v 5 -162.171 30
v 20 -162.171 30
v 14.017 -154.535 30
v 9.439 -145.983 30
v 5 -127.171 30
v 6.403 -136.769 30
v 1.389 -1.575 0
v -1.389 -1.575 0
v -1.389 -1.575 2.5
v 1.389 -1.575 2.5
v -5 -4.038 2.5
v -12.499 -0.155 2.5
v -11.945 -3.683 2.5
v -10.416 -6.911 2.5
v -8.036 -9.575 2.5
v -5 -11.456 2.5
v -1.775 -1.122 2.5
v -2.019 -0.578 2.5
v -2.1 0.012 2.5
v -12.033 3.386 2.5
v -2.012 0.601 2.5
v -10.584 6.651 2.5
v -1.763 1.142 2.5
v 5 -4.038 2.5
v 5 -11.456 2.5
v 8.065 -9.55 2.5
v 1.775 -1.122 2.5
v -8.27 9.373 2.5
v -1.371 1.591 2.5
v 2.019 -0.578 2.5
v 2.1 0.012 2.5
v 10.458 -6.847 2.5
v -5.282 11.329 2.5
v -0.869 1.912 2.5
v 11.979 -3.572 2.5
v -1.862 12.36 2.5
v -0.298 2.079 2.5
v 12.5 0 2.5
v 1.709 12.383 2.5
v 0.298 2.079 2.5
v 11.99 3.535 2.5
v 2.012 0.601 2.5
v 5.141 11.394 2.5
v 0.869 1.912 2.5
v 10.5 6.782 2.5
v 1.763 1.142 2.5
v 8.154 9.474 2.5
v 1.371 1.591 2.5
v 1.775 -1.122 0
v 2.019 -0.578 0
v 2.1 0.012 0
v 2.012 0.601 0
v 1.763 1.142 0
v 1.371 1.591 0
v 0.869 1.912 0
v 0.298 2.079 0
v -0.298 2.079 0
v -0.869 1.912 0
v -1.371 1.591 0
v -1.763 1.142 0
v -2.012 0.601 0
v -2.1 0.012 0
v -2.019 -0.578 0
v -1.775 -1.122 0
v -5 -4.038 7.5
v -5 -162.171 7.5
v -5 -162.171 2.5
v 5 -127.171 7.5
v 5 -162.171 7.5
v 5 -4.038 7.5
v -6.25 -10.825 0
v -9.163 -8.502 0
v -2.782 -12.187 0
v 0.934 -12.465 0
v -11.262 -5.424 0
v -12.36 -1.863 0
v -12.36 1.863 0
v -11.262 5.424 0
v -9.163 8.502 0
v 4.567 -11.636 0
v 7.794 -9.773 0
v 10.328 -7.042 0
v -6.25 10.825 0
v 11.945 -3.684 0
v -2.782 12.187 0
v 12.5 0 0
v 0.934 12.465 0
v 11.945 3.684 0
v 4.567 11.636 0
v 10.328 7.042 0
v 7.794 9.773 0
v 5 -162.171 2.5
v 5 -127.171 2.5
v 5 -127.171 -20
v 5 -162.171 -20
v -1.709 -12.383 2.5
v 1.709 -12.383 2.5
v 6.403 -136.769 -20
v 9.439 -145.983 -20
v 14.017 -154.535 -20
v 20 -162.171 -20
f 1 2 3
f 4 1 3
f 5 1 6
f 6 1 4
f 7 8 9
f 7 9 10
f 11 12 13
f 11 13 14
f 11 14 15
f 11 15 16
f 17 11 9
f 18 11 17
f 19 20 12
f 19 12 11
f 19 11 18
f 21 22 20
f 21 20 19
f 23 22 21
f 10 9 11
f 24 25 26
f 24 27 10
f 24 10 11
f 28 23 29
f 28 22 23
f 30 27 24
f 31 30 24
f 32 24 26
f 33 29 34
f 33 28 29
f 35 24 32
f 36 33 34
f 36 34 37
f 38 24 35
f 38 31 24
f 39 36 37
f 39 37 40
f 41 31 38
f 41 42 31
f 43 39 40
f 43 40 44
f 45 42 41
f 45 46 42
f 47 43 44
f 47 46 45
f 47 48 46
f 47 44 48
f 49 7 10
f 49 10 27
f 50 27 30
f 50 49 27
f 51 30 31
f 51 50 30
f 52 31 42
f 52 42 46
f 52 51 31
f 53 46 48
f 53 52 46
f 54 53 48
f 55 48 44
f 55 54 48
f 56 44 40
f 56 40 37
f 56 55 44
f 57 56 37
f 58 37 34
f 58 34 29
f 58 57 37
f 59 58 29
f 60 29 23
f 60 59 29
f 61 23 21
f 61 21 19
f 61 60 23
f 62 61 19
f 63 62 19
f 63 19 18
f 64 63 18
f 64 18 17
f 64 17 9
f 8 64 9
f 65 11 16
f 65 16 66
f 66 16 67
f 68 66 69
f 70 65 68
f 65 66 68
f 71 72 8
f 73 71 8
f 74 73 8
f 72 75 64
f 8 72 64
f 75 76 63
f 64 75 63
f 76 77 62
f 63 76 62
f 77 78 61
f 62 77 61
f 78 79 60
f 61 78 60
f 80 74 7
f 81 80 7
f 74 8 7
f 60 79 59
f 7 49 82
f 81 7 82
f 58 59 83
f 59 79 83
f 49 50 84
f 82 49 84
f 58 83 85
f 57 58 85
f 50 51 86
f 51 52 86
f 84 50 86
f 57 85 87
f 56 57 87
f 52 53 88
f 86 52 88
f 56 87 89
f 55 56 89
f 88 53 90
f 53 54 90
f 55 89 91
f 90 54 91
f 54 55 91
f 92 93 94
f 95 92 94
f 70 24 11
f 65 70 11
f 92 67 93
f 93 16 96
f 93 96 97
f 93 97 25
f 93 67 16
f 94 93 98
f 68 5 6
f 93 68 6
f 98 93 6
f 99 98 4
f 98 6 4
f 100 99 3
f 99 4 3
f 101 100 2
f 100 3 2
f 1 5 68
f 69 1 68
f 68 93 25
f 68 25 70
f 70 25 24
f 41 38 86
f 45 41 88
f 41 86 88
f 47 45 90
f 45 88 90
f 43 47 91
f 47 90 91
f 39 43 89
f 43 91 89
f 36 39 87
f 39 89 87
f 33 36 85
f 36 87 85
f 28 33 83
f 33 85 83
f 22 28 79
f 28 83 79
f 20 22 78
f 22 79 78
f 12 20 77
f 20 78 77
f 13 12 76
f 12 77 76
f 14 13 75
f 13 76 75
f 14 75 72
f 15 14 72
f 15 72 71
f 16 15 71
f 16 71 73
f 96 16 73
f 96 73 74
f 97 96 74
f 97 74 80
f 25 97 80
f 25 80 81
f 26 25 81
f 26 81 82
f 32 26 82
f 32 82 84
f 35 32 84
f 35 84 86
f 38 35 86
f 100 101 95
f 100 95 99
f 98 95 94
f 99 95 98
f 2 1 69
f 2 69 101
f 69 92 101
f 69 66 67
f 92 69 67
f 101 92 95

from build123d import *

# Parameters (mm, degrees)
SKETCH2_R               = 12.5
BOSS_EXTRUDE1_DEPTH     = 2.5
BOSS_EXTRUDE2_DEPTH     = 5
SKETCH5_W               = 50
SKETCH5_H               = 35
BOSS_EXTRUDE3_DEPTH     = 15
CUT_EXTRUDE1_DEPTH      = 171.878020085
CUT_EXTRUDE1_DEPTH_BACK = 171.878020085


with BuildPart() as part:
    # Sketch2 → Boss-Extrude1 (new body)
    with BuildSketch(Plane.XY):
        Circle(SKETCH2_R)
        with BuildLine():
            ThreePointArc((1.389019438, -1.575), (0, 2.1), (-1.389019438, -1.575))
            Line((-1.389019438, -1.575), (0, -1.575))
            Line((0, -1.575), (1.389019438, -1.575))
        make_face(mode=Mode.SUBTRACT)
    extrude(amount=BOSS_EXTRUDE1_DEPTH)

    # Sketch4 → Boss-Extrude2 (add)
    with BuildSketch(Plane.XY.offset(2.5)):
        Polygon((-5, -162.170582253), (5, -162.170582253), (5, -4.038316712), (0, -4.038316712), (-5, -4.038316712), align=None)
    extrude(amount=BOSS_EXTRUDE2_DEPTH)

    # Sketch5 → Boss-Extrude3 (add)
    with BuildSketch(Plane(origin=(5, 0, 0), x_dir=(0, 0, -1), z_dir=(1, 0, 0))):
        with Locations((-5, -144.670582253)):
            Rectangle(SKETCH5_W, SKETCH5_H)
    extrude(amount=BOSS_EXTRUDE3_DEPTH)

    # Sketch6 → Cut-Extrude1 (cut, two sides: drawn at the far end of the back side and taken through both)
    with BuildSketch(Plane(origin=(0, 0, -20), x_dir=(-1, 0, 0), z_dir=(0, 0, -1)).offset(-CUT_EXTRUDE1_DEPTH_BACK)):
        with BuildLine():
            Line((-20, -127.170582253), (-5, -127.170582253))
            ThreePointArc((-5, -127.170582253), (-9.438654014, -145.982587676), (-20, -162.170582253))
            Line((-20, -162.170582253), (-20, -127.170582253))
        make_face()
    extrude(amount=CUT_EXTRUDE1_DEPTH + CUT_EXTRUDE1_DEPTH_BACK, mode=Mode.SUBTRACT)


solid = part.part
